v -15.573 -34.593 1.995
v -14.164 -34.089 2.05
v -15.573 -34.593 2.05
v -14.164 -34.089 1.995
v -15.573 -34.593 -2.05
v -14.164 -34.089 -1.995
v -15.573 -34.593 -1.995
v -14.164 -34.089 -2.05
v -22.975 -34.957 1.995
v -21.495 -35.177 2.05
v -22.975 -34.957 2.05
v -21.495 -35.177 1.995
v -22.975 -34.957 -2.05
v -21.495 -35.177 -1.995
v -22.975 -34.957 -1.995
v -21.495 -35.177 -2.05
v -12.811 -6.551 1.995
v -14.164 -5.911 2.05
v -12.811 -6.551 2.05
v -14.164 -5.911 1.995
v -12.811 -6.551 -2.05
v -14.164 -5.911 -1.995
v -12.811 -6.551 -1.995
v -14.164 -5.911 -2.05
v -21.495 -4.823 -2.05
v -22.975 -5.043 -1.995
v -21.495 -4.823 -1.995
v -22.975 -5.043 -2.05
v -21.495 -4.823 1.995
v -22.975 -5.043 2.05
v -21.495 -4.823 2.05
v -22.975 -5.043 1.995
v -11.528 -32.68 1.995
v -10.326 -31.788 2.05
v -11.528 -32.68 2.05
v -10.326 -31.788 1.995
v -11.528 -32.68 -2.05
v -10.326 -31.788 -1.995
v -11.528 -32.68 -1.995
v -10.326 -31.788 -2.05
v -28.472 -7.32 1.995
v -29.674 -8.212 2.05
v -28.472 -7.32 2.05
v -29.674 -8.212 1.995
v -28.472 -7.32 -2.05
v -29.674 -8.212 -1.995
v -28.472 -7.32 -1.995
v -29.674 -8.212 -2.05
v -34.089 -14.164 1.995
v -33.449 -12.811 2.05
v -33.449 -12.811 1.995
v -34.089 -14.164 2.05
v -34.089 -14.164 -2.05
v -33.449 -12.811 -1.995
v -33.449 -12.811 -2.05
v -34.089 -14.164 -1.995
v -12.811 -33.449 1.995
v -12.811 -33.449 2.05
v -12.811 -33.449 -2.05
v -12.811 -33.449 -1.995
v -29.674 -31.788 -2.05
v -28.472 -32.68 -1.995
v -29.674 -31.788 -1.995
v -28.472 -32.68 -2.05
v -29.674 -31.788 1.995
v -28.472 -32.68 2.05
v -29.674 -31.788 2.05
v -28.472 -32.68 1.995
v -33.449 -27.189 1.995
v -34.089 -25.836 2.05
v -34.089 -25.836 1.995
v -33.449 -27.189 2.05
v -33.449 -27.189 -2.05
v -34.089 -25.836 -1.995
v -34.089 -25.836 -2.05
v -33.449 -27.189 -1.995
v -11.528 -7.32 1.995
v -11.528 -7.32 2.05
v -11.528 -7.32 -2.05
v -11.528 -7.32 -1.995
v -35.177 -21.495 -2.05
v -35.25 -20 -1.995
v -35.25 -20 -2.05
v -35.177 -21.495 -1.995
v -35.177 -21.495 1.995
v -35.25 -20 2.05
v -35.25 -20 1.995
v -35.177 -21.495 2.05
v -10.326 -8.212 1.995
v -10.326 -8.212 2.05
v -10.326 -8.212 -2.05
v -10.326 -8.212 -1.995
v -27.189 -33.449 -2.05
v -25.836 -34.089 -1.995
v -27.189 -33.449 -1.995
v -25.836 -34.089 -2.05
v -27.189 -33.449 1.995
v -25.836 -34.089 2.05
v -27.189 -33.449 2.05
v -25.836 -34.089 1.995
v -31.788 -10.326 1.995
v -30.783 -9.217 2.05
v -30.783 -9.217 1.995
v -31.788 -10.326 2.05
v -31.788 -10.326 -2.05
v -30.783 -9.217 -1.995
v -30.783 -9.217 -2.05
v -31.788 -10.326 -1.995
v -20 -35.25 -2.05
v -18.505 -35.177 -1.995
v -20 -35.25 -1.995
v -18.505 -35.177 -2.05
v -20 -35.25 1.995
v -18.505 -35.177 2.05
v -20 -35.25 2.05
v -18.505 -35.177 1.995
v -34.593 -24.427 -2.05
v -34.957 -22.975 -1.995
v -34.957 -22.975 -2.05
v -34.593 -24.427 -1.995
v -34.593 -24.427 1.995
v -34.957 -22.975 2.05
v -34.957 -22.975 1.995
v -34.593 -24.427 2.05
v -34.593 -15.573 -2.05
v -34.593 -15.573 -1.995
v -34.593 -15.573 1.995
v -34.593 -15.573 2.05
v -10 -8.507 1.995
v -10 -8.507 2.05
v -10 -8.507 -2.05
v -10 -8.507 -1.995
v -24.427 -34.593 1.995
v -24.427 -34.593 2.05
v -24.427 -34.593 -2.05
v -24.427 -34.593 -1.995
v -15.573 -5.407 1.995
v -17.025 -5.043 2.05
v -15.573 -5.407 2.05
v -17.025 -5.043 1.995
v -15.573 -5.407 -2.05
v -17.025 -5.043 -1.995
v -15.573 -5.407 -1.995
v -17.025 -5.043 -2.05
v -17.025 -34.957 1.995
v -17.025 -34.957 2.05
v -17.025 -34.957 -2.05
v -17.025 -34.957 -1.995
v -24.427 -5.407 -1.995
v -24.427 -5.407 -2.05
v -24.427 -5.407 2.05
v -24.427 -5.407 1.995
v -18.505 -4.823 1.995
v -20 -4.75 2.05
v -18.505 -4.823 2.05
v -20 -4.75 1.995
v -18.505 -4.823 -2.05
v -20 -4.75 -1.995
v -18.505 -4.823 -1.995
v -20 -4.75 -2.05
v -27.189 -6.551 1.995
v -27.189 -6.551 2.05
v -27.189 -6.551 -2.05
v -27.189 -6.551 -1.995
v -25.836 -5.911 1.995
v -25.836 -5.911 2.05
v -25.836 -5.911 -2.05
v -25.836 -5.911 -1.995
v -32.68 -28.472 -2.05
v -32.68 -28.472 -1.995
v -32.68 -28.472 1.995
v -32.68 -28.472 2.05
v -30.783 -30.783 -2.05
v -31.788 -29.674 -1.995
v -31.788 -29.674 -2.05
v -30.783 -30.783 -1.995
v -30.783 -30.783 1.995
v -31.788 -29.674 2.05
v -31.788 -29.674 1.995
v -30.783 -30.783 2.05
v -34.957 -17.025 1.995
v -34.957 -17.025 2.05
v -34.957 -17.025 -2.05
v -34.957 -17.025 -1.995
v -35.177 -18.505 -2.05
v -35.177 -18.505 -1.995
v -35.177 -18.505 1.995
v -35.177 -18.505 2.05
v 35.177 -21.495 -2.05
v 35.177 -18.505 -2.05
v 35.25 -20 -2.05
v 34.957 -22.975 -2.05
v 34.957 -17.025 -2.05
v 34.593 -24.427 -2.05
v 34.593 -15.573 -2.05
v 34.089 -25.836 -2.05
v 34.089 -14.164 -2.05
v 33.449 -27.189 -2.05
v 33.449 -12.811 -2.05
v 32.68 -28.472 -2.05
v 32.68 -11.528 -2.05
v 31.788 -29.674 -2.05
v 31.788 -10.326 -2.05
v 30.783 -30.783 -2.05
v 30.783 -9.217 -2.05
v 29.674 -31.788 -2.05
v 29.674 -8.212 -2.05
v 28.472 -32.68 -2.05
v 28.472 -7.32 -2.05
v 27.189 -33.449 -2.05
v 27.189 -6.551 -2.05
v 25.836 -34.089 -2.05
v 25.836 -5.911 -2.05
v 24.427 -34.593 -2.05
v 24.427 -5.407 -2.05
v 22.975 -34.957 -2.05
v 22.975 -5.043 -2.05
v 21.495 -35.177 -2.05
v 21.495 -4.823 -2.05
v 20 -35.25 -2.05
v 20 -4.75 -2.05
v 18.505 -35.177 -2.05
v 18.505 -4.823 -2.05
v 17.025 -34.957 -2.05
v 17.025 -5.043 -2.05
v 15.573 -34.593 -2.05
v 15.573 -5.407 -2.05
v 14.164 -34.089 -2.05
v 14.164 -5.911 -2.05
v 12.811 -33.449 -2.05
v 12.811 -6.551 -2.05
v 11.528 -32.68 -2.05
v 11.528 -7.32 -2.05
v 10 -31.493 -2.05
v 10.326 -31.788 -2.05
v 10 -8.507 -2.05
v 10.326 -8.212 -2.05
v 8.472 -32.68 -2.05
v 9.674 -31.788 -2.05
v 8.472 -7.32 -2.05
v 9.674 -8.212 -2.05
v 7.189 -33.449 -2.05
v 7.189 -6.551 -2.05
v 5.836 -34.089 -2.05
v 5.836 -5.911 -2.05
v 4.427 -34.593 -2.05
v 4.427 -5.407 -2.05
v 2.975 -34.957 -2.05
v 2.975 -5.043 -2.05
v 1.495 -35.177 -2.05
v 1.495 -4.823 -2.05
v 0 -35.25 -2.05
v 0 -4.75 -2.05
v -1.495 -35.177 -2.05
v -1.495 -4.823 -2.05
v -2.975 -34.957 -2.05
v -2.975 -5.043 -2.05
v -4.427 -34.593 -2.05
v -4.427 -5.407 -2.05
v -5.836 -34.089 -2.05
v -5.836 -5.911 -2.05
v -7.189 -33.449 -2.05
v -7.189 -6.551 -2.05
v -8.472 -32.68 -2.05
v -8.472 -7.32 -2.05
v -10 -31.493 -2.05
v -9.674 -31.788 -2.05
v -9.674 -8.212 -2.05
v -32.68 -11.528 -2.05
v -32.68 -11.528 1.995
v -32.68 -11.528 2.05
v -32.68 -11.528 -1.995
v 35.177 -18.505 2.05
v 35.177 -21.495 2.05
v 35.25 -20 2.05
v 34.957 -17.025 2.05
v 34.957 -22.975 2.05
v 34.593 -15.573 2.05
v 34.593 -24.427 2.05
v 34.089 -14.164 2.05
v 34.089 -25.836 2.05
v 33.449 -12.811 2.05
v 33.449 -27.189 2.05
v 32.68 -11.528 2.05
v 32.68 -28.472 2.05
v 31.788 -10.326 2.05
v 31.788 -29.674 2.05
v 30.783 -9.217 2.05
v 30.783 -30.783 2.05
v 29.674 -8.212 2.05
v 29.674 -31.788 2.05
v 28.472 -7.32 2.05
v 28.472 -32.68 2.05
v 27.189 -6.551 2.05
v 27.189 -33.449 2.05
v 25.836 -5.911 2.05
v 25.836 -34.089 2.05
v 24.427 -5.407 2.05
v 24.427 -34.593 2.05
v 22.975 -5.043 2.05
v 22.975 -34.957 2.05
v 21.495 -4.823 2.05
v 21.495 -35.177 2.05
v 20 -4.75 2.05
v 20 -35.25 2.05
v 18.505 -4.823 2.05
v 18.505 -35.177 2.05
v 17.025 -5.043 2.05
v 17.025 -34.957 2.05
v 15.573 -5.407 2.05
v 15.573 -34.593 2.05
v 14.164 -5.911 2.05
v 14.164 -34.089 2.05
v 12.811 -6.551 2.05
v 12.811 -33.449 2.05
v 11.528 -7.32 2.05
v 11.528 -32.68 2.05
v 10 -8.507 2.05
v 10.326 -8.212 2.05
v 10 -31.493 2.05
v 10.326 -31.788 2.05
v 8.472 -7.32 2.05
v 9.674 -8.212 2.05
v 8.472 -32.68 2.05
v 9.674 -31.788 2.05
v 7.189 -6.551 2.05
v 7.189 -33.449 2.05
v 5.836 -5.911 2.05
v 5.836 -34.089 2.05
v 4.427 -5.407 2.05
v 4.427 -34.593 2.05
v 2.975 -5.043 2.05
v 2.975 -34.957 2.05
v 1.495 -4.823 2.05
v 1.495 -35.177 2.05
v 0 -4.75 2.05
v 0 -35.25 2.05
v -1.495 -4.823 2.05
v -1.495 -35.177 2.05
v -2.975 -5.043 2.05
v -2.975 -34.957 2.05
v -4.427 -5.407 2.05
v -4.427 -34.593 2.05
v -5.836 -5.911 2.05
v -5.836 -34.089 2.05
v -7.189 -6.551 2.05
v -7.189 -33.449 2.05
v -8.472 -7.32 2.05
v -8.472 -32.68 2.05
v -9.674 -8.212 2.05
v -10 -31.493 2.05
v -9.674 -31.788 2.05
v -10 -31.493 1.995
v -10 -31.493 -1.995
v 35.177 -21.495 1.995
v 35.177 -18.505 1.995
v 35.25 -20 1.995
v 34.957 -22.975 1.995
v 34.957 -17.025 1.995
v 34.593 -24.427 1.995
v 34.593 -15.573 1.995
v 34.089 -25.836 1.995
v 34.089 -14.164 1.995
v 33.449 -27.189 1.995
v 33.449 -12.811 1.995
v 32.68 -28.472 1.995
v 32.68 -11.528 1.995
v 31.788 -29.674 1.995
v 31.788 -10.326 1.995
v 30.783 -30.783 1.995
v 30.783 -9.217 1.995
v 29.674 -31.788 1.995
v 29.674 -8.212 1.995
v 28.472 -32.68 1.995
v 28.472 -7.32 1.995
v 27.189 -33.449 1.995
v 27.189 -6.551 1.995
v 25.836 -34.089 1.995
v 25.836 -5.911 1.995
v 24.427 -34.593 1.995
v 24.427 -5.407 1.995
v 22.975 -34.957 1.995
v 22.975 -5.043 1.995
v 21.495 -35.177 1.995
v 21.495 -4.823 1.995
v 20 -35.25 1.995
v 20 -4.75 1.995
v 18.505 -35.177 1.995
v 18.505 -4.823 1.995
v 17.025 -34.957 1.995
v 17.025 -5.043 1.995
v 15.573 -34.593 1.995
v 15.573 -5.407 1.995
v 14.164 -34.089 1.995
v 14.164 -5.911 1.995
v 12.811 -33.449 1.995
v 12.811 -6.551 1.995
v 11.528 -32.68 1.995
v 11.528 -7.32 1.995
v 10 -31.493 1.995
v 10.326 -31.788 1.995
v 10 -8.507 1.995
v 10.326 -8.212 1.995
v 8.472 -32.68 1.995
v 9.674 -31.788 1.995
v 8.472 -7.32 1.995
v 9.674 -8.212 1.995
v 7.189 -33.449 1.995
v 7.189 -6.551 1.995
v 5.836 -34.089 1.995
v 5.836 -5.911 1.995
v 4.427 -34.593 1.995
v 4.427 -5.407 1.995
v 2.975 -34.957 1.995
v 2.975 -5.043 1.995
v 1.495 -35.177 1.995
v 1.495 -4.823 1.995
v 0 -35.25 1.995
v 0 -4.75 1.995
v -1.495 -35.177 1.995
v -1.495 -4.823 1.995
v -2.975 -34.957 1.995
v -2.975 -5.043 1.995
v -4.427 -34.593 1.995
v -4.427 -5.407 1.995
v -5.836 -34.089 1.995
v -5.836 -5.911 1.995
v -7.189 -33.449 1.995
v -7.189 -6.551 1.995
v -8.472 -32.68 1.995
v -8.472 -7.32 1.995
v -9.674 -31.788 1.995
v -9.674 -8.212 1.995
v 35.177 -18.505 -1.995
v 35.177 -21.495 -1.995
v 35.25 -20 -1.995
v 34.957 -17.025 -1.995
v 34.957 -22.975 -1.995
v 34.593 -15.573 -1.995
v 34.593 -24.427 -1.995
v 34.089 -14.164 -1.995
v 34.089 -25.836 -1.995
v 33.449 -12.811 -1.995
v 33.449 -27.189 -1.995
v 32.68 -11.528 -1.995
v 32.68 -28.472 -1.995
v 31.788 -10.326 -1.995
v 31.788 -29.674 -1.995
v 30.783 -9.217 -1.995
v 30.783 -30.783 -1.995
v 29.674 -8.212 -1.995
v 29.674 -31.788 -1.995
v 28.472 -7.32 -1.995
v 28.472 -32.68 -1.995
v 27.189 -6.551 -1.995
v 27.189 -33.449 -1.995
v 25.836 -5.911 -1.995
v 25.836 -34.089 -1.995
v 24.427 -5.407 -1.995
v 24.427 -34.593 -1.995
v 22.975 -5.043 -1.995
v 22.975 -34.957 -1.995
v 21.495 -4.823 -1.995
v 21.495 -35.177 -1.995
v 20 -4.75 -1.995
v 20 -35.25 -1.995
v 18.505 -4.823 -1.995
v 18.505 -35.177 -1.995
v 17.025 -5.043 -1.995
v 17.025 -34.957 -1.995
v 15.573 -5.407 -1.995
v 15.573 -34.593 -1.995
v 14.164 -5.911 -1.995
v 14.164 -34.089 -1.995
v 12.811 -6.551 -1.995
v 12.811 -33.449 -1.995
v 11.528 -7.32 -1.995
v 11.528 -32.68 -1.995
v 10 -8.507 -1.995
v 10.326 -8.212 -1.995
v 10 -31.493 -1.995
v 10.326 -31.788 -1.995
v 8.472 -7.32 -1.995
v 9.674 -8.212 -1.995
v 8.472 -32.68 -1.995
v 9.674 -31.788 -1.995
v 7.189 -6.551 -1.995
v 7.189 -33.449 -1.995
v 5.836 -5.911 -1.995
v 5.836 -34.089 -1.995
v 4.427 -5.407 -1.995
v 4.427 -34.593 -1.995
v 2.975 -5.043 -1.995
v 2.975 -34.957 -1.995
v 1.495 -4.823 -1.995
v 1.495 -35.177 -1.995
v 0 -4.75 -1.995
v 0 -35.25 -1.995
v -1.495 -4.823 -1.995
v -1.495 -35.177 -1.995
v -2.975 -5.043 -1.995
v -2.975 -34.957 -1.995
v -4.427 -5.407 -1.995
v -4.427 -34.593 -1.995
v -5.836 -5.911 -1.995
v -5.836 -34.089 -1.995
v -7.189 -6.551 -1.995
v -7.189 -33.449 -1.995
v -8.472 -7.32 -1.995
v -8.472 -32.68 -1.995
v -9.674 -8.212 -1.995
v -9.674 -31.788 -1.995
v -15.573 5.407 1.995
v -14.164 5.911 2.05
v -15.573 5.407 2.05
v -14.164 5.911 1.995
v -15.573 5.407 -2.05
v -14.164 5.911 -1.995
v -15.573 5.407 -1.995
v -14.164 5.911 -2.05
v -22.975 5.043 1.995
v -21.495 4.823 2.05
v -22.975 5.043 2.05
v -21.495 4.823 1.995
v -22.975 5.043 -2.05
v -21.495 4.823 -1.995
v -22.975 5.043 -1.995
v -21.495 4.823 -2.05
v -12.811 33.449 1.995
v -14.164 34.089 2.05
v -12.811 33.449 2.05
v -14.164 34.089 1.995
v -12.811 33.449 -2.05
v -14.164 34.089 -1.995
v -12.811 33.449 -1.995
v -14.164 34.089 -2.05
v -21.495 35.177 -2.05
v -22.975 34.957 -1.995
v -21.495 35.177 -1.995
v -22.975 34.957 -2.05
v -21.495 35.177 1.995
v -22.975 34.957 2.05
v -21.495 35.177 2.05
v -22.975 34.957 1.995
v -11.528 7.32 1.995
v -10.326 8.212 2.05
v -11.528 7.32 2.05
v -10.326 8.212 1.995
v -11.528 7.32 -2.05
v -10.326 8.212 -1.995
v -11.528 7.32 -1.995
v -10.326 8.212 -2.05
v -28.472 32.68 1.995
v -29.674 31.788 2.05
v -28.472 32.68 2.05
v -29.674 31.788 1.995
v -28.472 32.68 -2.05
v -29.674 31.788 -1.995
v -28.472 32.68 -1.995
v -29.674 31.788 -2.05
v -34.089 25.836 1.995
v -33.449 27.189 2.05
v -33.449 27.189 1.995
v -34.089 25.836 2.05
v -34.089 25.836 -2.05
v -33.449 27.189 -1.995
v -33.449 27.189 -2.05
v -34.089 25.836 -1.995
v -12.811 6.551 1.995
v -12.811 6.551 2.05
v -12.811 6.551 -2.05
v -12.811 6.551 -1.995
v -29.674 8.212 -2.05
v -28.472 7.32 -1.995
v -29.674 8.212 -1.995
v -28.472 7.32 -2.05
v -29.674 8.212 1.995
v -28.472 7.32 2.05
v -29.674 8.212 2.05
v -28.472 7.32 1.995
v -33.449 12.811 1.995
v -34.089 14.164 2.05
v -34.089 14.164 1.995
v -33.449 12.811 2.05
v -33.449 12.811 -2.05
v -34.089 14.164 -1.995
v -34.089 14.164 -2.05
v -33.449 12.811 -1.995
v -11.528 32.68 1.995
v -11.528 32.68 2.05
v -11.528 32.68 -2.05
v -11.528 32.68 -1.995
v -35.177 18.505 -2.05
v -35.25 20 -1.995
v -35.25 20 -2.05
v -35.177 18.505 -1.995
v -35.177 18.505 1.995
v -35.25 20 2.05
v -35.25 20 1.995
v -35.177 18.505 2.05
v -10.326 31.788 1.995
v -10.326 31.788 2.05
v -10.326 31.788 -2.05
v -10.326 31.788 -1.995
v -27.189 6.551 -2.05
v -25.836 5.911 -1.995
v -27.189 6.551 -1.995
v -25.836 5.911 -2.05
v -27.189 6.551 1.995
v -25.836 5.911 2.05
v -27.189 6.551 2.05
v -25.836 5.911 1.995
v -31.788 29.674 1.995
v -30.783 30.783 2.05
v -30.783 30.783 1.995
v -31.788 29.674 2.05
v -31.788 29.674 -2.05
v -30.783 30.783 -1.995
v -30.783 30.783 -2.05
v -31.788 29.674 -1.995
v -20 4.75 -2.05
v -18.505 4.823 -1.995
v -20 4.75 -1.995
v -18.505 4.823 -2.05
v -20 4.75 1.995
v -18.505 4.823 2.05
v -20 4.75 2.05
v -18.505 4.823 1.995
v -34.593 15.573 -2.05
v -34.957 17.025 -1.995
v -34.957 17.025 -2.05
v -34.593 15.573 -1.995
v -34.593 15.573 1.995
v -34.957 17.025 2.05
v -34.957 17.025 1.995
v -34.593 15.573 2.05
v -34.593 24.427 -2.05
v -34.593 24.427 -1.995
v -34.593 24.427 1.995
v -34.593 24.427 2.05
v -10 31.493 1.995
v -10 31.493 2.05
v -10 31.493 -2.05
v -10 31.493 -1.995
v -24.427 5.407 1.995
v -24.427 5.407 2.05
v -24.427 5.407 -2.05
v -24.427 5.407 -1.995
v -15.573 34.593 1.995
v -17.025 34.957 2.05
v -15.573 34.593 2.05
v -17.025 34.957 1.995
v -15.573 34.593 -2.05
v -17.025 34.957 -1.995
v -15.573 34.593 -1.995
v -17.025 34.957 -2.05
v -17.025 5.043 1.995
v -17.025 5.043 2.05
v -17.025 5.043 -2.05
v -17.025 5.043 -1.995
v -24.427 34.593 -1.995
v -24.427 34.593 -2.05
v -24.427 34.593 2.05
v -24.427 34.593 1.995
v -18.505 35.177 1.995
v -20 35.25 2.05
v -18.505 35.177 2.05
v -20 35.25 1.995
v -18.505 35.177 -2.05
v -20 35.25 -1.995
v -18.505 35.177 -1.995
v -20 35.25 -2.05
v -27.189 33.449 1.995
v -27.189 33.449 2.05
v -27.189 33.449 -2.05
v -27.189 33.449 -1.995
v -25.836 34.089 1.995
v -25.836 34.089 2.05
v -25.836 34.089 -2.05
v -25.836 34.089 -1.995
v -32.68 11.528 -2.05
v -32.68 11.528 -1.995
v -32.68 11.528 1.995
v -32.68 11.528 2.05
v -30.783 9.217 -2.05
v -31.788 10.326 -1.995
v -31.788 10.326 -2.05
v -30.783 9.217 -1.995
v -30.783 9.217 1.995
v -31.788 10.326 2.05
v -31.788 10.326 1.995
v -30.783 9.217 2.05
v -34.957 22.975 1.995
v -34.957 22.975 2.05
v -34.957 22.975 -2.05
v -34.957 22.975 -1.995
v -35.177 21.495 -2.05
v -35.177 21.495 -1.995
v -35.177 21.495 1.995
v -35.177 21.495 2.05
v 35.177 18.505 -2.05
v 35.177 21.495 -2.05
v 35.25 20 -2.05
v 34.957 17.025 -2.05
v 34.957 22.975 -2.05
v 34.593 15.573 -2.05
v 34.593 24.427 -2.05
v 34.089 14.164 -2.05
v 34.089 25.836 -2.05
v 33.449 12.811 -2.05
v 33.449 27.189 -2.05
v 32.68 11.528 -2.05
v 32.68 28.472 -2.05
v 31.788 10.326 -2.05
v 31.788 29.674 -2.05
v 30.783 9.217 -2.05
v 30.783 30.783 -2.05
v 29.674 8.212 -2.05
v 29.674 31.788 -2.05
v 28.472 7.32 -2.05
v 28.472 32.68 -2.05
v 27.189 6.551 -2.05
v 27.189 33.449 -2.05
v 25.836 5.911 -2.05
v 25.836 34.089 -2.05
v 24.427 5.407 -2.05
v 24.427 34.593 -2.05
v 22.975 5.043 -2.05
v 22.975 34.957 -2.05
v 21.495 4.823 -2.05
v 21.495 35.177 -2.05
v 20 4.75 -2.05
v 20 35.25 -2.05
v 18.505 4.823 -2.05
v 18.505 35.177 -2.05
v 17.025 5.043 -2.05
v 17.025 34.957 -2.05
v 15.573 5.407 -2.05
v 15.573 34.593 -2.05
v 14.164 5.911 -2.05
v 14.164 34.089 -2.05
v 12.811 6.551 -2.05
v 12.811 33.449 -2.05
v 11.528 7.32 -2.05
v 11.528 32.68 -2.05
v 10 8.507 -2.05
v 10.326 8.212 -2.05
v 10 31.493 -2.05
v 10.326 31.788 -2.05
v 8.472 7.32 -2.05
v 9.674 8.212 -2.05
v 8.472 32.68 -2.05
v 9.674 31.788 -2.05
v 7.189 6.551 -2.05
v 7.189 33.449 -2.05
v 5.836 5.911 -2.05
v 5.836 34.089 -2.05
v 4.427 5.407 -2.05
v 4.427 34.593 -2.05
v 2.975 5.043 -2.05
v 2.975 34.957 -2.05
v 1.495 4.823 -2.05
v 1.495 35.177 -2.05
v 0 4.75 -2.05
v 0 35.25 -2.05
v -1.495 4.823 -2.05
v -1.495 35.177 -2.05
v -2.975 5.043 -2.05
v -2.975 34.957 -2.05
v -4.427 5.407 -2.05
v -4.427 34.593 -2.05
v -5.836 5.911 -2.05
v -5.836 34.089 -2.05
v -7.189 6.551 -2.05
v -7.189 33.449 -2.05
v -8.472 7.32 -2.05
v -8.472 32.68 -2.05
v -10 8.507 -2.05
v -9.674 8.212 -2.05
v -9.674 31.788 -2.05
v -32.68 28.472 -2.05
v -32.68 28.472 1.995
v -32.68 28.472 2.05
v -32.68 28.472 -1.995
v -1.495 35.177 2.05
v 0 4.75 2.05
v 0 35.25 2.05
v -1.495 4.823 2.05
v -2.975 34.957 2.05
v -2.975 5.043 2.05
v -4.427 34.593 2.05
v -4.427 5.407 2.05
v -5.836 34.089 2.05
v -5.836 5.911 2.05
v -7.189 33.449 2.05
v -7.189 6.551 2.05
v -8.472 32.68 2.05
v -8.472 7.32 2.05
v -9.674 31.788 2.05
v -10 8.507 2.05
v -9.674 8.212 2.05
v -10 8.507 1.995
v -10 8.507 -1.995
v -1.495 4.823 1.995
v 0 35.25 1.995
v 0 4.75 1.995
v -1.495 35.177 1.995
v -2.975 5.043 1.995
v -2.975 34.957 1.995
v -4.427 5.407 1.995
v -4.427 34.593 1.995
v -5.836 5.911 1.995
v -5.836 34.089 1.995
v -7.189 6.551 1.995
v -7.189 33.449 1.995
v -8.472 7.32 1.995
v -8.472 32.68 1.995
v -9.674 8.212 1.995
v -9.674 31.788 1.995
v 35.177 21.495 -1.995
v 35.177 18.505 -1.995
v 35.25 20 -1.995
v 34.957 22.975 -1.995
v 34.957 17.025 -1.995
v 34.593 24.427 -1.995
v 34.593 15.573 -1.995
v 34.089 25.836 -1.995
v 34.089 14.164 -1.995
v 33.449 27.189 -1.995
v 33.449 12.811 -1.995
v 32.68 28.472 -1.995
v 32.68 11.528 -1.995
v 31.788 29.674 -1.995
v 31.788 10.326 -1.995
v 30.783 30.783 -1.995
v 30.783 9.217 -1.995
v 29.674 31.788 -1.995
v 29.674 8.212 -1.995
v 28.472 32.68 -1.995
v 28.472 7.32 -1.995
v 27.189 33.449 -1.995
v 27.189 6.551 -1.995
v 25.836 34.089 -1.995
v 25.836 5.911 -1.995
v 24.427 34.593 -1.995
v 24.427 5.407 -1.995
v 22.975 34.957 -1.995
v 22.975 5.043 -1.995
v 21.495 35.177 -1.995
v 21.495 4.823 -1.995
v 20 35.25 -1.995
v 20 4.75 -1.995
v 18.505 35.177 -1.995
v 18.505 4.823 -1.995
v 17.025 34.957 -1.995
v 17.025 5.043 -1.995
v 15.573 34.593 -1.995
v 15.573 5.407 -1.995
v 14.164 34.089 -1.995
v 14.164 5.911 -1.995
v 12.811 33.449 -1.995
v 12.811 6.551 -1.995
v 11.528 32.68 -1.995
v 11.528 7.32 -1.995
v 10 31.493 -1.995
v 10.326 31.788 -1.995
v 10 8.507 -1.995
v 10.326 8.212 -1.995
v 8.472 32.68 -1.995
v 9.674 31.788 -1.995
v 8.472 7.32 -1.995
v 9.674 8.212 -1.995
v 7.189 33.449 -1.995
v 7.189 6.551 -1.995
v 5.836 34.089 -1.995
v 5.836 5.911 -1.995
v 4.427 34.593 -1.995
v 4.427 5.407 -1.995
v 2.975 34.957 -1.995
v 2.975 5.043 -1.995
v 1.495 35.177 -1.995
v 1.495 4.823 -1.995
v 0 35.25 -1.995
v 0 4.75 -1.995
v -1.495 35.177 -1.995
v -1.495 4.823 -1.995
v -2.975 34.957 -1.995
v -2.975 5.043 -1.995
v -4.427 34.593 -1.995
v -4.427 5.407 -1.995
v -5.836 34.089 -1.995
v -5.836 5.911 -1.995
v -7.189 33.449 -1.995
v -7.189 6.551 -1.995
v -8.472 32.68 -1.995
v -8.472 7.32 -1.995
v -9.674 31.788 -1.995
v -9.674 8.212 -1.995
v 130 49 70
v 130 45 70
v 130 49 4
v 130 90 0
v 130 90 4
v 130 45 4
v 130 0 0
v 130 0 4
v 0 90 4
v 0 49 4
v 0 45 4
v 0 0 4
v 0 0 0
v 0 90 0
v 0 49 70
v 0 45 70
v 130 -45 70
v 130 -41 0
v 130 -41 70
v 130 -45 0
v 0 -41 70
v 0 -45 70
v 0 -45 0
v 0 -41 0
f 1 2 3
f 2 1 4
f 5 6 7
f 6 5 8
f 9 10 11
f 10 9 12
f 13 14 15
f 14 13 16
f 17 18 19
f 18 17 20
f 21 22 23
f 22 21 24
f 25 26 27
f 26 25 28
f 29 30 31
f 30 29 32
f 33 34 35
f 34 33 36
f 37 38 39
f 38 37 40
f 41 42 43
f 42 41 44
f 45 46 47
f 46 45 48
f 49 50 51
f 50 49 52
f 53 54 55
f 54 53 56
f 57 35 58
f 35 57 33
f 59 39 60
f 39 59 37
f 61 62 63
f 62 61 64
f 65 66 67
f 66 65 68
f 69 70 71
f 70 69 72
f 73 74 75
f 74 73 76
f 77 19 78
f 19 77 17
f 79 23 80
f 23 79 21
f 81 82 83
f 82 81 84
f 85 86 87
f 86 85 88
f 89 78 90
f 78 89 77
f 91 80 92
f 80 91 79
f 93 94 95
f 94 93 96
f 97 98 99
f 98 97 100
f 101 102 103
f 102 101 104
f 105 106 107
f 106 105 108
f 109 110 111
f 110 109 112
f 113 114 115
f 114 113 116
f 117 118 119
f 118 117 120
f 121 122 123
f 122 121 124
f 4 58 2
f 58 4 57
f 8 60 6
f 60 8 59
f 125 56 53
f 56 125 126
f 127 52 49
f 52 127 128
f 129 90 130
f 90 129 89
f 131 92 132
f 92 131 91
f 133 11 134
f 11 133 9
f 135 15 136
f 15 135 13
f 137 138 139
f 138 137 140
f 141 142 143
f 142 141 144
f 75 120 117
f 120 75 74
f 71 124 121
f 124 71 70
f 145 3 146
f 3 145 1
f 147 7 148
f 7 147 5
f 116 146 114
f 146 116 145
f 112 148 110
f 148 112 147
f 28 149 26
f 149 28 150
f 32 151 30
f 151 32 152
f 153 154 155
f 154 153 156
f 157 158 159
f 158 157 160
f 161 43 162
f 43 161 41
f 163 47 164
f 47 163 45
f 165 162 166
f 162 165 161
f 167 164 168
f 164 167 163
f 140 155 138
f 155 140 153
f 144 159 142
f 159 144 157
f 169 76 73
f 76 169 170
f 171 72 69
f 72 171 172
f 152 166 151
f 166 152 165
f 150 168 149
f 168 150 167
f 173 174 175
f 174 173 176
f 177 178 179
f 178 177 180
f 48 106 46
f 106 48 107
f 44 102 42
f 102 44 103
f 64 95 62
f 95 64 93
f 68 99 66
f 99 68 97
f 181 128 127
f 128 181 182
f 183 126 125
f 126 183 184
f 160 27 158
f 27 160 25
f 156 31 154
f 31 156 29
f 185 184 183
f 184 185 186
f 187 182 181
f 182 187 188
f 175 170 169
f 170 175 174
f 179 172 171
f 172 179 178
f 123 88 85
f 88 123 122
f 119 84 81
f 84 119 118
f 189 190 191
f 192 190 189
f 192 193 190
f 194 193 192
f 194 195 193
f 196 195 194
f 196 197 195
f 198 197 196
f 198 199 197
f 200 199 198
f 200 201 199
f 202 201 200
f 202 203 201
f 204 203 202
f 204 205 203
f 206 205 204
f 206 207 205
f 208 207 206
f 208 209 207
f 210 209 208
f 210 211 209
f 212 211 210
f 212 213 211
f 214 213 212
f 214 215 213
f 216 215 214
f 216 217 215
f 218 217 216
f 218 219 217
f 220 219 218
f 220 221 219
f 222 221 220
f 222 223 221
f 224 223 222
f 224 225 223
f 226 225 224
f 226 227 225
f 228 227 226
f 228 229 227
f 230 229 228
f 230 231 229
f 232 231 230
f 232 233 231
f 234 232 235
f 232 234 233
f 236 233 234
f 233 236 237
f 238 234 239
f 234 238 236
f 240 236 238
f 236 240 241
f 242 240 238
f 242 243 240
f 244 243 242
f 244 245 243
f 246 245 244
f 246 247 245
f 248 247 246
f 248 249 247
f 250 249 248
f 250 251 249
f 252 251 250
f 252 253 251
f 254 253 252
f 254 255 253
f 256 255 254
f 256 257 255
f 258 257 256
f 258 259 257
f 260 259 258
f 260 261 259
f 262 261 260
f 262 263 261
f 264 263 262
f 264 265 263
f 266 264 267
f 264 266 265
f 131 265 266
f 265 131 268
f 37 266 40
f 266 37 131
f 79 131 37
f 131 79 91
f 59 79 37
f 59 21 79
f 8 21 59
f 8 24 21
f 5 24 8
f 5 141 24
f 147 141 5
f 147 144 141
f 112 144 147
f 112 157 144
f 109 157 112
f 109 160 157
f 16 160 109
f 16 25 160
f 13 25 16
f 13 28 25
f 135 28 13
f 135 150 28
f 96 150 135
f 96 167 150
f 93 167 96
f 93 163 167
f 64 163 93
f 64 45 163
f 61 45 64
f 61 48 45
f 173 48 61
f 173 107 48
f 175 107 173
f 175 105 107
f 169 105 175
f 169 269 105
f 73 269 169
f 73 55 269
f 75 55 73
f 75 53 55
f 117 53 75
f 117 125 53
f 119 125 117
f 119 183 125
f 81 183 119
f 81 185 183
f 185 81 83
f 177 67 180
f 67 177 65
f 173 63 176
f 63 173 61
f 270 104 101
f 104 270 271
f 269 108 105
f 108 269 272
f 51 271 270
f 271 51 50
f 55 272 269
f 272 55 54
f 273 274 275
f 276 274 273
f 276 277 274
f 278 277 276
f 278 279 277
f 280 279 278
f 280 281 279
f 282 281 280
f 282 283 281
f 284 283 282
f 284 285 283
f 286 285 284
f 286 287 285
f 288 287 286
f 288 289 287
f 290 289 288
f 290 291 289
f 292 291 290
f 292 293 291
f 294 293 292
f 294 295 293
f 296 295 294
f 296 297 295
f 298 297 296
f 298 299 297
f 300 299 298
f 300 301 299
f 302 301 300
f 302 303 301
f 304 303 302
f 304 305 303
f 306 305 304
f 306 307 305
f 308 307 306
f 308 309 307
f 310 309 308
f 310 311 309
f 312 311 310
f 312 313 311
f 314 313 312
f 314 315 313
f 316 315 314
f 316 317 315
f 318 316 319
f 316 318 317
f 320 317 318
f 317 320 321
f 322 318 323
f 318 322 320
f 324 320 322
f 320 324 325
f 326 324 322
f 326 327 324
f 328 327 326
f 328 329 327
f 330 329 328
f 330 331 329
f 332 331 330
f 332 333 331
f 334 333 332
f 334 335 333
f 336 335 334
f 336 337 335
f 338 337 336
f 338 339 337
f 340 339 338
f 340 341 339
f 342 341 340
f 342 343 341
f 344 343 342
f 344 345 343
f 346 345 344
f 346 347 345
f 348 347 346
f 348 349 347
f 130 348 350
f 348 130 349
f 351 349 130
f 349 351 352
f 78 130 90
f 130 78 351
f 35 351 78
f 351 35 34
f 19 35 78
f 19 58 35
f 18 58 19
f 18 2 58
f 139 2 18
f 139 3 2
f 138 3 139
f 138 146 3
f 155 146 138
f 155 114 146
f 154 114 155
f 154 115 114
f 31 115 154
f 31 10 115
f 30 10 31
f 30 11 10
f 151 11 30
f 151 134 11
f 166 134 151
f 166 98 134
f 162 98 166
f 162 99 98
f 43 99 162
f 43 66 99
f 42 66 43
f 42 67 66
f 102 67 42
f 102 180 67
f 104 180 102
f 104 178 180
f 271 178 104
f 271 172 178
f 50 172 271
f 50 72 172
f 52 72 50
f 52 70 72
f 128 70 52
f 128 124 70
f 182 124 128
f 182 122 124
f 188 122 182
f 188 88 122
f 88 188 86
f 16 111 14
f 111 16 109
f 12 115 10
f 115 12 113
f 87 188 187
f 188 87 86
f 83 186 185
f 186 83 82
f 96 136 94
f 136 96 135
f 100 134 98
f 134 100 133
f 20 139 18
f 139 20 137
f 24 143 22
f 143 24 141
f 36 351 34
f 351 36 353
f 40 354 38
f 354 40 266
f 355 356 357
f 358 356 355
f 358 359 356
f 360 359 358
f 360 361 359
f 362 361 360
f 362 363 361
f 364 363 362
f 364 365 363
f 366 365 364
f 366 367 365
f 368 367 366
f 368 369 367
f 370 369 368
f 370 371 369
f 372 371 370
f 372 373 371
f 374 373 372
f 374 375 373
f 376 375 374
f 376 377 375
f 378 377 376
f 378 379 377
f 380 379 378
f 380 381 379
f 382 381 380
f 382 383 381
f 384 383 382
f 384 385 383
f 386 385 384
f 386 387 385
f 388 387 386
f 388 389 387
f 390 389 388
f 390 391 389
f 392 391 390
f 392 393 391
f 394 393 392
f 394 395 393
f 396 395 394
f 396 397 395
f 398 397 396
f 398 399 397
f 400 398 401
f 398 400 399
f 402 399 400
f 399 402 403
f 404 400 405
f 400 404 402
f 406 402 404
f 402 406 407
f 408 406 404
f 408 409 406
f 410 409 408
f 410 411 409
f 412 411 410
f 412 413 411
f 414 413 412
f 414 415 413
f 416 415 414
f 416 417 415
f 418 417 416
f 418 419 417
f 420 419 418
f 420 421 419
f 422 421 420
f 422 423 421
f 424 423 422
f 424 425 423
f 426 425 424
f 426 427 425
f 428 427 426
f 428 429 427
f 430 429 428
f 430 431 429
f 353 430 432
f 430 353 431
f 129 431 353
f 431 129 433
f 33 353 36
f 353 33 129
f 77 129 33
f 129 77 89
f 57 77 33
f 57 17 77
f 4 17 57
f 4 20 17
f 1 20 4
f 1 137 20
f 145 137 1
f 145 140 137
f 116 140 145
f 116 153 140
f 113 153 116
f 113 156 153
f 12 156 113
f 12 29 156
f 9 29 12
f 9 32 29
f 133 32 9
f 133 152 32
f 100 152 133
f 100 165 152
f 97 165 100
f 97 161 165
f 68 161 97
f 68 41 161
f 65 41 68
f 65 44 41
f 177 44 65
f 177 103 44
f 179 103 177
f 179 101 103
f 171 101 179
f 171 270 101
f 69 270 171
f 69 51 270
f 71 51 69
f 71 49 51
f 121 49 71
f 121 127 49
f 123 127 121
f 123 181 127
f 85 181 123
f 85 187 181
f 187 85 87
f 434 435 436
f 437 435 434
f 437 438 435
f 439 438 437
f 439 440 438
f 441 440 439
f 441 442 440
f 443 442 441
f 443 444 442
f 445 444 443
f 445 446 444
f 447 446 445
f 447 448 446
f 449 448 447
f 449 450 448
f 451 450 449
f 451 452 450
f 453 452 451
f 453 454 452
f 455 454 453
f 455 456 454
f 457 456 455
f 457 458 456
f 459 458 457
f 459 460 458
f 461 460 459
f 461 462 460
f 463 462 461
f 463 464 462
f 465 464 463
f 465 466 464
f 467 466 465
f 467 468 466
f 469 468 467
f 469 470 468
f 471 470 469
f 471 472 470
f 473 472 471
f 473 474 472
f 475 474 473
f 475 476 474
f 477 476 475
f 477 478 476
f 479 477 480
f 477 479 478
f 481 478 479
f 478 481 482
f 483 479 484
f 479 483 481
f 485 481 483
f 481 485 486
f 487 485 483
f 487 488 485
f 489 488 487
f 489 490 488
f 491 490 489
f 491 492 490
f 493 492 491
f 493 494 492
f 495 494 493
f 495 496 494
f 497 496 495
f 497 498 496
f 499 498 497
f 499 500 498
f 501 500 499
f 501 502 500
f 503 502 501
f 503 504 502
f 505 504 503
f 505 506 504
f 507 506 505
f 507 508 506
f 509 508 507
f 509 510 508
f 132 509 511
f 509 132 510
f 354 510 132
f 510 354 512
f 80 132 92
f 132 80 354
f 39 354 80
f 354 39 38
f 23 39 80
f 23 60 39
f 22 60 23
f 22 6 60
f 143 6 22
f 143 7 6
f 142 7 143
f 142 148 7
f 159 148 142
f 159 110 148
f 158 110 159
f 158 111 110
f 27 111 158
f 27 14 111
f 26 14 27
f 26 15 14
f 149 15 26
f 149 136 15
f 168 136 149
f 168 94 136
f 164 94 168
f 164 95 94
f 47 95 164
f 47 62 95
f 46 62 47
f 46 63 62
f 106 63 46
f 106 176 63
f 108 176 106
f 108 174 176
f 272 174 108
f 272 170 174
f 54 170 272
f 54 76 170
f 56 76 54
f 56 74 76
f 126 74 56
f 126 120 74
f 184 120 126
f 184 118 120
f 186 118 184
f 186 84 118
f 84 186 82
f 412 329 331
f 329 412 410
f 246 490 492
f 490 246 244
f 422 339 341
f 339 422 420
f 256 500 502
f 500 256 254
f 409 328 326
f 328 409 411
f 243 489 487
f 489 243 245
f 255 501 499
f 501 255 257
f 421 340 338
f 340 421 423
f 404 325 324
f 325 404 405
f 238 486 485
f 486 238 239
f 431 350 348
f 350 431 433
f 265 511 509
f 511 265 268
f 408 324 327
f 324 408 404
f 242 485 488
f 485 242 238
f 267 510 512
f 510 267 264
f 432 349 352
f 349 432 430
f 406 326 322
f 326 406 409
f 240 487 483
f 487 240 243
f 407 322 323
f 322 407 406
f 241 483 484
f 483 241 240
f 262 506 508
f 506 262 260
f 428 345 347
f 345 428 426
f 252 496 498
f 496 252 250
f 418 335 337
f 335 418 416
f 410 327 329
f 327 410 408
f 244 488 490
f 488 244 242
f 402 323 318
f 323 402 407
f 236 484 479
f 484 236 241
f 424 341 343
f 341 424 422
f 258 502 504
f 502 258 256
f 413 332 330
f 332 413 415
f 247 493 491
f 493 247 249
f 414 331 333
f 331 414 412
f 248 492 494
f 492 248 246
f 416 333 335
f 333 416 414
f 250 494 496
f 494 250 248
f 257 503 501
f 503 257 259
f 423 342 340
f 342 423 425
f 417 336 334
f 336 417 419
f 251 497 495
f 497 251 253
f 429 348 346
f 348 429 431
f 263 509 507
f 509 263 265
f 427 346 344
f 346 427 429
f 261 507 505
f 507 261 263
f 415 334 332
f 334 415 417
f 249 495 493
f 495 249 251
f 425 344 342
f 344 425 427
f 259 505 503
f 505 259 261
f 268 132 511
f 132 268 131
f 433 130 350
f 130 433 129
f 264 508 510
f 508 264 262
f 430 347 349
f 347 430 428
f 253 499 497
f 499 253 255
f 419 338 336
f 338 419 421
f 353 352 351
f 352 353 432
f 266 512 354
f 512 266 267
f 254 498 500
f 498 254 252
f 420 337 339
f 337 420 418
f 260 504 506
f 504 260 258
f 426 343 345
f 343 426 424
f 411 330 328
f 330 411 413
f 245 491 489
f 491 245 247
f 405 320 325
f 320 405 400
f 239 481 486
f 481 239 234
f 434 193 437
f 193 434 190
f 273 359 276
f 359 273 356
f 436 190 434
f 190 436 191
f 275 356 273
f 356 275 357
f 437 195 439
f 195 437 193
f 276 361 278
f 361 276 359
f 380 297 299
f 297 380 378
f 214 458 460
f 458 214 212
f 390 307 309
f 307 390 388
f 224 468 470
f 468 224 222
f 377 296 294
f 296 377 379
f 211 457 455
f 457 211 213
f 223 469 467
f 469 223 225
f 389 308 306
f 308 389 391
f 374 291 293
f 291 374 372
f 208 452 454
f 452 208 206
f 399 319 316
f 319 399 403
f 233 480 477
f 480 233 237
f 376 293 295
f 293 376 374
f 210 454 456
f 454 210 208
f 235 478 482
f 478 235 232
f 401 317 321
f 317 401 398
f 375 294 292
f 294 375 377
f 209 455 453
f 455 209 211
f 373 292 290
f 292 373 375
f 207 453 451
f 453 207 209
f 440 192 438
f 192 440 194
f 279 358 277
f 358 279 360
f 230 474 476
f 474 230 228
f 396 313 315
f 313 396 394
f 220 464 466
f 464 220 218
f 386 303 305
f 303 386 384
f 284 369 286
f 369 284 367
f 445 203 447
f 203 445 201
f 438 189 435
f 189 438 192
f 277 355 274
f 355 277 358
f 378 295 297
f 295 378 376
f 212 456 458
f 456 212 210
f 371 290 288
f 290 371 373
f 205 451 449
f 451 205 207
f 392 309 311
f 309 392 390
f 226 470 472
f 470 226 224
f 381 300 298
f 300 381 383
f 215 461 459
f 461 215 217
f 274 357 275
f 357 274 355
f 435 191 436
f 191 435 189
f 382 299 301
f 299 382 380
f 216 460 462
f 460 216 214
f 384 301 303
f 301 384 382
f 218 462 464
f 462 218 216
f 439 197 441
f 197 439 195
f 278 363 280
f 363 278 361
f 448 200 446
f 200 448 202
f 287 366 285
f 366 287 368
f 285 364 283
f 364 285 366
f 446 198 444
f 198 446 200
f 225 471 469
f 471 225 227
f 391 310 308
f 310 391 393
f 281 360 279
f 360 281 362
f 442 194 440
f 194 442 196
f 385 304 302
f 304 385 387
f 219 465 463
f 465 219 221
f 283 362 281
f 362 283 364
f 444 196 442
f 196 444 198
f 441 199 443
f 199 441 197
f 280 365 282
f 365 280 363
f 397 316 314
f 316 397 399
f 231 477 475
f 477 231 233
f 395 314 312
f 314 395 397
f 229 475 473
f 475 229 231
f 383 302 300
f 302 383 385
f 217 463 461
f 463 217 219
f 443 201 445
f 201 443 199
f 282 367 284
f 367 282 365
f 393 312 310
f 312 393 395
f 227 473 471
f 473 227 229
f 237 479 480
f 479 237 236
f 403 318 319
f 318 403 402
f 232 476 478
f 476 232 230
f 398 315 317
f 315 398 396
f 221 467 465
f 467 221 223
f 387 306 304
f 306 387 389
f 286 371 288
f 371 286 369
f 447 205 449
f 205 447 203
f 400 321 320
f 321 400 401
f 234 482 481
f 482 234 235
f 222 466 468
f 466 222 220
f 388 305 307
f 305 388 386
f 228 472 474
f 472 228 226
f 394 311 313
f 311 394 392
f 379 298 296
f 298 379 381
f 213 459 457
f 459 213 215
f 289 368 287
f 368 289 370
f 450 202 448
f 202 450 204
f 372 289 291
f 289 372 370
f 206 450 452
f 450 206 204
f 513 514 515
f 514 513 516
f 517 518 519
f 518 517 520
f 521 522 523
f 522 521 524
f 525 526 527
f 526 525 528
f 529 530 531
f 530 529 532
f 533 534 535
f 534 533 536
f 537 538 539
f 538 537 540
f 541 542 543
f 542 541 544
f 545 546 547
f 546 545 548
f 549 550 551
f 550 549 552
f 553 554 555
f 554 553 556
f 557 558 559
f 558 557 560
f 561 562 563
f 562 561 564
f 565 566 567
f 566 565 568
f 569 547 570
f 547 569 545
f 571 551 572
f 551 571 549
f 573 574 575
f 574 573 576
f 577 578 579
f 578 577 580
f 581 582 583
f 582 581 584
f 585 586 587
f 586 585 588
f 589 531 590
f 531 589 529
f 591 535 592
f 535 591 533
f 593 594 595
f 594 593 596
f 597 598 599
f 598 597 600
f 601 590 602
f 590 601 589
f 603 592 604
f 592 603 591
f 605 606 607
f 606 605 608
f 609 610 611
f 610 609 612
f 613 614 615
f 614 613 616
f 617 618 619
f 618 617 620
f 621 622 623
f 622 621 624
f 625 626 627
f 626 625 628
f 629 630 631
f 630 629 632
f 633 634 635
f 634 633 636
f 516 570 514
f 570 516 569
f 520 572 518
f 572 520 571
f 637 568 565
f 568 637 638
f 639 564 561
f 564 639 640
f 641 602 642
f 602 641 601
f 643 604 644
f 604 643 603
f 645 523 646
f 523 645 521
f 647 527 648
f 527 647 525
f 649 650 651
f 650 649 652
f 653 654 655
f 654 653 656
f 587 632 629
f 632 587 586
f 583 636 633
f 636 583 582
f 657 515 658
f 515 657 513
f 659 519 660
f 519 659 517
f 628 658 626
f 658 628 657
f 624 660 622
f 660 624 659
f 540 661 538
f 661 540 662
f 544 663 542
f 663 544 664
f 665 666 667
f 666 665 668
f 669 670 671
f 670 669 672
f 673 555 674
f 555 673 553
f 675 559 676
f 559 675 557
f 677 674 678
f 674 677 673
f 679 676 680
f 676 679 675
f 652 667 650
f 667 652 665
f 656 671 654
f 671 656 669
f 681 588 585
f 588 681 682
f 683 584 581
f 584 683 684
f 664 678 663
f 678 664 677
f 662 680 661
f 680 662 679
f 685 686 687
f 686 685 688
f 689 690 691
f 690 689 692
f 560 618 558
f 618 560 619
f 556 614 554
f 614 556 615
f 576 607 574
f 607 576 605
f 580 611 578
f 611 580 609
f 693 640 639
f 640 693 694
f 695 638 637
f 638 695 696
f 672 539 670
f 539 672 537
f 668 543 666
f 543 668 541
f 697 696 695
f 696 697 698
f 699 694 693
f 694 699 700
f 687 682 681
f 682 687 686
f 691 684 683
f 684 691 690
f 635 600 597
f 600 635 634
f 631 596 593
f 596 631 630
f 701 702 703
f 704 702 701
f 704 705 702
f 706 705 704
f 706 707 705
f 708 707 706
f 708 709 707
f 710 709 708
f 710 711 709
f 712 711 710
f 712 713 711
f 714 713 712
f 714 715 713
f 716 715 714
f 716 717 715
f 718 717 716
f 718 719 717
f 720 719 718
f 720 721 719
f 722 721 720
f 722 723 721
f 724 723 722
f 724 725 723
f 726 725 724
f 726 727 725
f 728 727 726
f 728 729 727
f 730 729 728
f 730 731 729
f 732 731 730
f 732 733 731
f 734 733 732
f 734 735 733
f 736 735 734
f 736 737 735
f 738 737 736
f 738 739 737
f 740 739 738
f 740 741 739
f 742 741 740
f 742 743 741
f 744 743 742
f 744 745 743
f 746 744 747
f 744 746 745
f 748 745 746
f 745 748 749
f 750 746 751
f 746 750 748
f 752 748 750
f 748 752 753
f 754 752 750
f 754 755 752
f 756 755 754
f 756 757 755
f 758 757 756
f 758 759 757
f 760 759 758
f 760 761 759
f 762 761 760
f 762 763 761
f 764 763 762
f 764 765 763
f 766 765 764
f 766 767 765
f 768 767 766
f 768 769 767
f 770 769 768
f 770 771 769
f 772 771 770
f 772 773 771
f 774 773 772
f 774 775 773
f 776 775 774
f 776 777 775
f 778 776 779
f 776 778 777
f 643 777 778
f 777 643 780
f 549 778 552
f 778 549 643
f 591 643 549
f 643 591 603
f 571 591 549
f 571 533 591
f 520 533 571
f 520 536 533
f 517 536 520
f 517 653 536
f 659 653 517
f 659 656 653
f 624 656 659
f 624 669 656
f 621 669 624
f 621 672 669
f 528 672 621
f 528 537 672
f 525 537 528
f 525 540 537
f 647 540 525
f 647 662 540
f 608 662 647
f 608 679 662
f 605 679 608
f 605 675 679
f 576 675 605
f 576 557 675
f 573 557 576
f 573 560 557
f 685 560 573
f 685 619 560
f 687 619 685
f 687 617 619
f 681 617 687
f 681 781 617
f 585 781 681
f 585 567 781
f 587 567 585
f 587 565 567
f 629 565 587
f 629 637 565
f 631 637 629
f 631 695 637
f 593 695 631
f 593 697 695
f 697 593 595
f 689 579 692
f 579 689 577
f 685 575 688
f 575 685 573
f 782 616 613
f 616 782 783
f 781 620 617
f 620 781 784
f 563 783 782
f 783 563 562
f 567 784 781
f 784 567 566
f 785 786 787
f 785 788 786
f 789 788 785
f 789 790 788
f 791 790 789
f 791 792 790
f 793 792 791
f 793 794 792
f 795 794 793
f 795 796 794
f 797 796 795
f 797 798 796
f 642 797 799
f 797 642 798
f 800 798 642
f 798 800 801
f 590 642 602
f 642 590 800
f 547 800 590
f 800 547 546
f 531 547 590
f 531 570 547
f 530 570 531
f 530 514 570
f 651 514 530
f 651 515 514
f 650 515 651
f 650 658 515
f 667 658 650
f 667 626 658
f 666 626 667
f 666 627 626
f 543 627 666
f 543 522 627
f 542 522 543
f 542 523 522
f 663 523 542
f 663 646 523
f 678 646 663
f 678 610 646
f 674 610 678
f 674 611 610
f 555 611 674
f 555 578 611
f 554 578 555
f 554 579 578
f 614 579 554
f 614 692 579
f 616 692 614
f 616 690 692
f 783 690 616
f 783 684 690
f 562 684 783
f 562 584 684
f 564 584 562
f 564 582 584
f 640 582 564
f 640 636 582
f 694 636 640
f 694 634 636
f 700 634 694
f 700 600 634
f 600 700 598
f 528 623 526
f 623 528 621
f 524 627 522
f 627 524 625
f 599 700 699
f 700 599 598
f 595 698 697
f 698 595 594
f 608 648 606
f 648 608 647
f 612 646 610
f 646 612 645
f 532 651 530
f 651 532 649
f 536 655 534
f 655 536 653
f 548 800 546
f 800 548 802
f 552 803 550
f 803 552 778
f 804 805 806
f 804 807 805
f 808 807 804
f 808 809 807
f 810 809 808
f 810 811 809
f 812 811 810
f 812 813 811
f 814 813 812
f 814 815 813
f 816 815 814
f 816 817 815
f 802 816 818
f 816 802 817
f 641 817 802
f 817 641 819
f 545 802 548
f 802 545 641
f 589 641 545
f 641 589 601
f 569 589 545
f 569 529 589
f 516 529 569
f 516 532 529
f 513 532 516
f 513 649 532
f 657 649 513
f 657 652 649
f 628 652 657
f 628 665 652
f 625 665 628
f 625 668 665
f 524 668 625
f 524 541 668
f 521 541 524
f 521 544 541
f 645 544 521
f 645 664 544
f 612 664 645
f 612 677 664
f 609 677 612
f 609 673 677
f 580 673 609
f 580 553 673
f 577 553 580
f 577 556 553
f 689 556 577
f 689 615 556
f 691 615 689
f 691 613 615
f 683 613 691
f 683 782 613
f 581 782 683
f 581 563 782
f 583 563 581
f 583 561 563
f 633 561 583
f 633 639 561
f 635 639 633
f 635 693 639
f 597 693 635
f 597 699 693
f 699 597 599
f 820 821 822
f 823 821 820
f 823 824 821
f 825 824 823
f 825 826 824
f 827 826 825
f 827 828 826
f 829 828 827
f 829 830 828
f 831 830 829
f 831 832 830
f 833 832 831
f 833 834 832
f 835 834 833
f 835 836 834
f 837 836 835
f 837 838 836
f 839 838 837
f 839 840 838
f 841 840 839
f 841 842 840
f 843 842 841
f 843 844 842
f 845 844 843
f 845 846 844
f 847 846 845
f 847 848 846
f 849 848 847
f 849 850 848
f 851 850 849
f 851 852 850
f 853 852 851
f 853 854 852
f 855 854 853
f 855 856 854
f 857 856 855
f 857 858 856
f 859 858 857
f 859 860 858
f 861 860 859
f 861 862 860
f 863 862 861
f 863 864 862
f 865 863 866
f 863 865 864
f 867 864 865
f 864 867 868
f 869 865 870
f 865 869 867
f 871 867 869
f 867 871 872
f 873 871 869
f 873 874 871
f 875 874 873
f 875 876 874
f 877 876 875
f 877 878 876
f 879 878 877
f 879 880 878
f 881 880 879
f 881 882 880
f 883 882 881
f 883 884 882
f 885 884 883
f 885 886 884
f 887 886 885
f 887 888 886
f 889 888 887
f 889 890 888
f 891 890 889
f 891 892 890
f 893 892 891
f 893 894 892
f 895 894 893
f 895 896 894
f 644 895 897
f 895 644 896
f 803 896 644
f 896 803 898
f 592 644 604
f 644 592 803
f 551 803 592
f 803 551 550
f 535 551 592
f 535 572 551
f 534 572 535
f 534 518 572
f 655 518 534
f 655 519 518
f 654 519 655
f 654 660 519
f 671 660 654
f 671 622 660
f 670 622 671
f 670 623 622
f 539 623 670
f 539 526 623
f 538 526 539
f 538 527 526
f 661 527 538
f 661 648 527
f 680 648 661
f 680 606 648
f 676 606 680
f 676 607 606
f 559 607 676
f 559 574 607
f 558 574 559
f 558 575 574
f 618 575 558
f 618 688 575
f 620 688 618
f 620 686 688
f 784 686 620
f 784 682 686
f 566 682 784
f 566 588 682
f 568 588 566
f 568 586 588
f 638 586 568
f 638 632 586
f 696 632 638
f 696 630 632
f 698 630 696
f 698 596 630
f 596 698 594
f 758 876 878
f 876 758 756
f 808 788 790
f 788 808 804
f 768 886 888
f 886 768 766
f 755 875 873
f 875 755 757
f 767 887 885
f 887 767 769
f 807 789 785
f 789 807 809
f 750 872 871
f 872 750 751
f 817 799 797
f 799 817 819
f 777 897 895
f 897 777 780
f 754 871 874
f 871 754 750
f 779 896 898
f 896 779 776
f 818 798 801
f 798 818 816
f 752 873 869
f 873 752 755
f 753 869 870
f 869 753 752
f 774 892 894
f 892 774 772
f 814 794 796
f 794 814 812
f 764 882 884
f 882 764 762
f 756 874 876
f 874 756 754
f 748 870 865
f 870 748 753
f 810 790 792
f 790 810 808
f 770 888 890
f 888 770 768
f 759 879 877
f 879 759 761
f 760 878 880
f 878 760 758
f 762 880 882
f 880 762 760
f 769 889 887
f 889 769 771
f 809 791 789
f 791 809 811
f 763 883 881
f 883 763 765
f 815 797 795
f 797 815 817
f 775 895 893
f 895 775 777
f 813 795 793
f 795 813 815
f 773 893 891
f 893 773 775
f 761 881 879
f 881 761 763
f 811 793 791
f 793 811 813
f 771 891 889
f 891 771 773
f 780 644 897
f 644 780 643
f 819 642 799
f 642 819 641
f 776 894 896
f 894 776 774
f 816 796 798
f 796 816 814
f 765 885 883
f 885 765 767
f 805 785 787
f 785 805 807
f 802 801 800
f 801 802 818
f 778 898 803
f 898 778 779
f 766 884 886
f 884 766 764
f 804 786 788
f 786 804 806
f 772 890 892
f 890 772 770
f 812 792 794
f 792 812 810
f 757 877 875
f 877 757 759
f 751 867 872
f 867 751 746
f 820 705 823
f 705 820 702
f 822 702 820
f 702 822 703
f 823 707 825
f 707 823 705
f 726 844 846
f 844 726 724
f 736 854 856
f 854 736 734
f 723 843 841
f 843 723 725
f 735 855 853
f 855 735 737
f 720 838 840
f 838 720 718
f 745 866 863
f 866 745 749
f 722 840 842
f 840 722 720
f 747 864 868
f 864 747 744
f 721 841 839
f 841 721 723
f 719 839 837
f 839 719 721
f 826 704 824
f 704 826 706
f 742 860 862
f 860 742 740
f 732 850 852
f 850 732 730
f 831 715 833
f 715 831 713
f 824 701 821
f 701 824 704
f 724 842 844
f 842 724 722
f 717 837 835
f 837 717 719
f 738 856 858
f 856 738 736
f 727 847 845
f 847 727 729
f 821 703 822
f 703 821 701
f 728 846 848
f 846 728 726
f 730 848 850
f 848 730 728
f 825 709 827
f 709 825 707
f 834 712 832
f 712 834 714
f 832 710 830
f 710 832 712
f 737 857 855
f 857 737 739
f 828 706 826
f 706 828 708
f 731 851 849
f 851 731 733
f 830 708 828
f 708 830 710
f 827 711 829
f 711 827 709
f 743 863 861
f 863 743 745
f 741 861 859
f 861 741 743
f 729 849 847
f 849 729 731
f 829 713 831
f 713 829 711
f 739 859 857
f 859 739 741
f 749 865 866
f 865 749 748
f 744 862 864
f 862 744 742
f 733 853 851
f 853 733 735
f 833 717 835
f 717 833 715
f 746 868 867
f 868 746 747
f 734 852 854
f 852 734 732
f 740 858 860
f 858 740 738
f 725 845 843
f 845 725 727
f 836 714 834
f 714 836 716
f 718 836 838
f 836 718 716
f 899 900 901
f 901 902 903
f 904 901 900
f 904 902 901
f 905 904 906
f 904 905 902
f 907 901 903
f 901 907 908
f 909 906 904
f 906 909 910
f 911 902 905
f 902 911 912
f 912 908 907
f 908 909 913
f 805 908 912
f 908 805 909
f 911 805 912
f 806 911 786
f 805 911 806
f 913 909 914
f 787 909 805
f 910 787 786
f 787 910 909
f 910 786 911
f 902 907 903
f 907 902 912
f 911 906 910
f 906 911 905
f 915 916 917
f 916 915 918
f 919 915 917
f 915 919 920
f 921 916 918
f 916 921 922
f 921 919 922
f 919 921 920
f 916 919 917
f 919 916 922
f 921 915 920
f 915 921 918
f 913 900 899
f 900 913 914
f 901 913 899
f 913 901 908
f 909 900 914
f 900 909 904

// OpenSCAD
// Rack for six 50 mL conical (Falcon-type) tubes
// Print orientation: Upside down (walls up, holes in plate).
// After printing, flip over to stand on walls.

// --- Dimensions ---
// Plate dimensions
$plate_length = 130; // X
$plate_width = 90;   // Y
$plate_thickness = 4; // Z

// Hole specifications
$hole_diameter = 30.5;
$hole_count_x = 3;
$hole_count_y = 2;
$hole_spacing_x = 40; // Centre-to-centre
$hole_spacing_y = 40; // Centre-to-centre

// Wall specifications
$wall_length = 130;   // X
$wall_thickness = 4;  // Y
$wall_height = 70;    // Z (total height from bed)

// --- Configuration ---
$fn = 64; // Smooth curves for holes

// --- Helper: Center coordinates ---
// Plate is centered on origin.
$plate_x_center = 0;
$plate_y_center = 0;

// Calculate hole positions relative to plate center
// Row 1 (Y = -spacing/2), Row 2 (Y = +spacing/2)
// Col 1 (X = -spacing/2), Col 2 (X = 0), Col 3 (X = +spacing/2)
$hole_positions = [
    [ -$hole_spacing_x/2, -$hole_spacing_y/2 ],
    [  0,                 -$hole_spacing_y/2 ],
    [  $hole_spacing_x/2, -$hole_spacing_y/2 ],
    [ -$hole_spacing_x/2,  $hole_spacing_y/2 ],
    [  0,                 $hole_spacing_y/2 ],
    [  $hole_spacing_x/2,  $hole_spacing_y/2 ]
];

// --- Main Module ---
module tube_rack() {
    union() {
        // 1. The Base Plate
        // Lies on Z=0 to Z=$plate_thickness
        translate([0, 0, 0]) {
            cube([
                $plate_length,
                $plate_width,
                $plate_thickness
            ], center = false);
        }

        // 2. The Through-Holes
        // Cut into the plate. Extend slightly past Z=0 to ensure clean cut.
        for (p = $hole_positions) {
            translate(p) {
                difference() {
                    // The hole cylinder (slightly larger to ensure clean cut)
                    cylinder(
                        h = $plate_thickness + 0.1,
                        d = $hole_diameter,
                        center = true
                    );
                    // The solid plate part (slightly smaller to avoid coplanar faces)
                    cube([
                        $hole_diameter,
                        $hole_diameter,
                        $plate_thickness - 0.01
                    ], center = true);
                }
            }
        }

        // 3. The Side Walls
        // Two walls along the long edges (Y = +/- $plate_width/2).
        // They rise from Z=0 to Z=$wall_height.
        // Since the plate is 4mm thick, the walls effectively start at Z=0 and go up.
        // We model them as extrusions from the plate surface.
        
        // Left Wall (at Y = -$plate_width/2)
        translate([0, -$plate_width/2, 0]) {
            cube([
                $wall_length,
                $wall_thickness,
                $wall_height
            ], center = false);
        }

        // Right Wall (at Y = +$plate_width/2)
        translate([0, $plate_width/2, 0]) {
            cube([
                $wall_length,
                $wall_thickness,
                $wall_height
            ], center = false);
        }
    }
}

// Generate the part
tube_rack();
